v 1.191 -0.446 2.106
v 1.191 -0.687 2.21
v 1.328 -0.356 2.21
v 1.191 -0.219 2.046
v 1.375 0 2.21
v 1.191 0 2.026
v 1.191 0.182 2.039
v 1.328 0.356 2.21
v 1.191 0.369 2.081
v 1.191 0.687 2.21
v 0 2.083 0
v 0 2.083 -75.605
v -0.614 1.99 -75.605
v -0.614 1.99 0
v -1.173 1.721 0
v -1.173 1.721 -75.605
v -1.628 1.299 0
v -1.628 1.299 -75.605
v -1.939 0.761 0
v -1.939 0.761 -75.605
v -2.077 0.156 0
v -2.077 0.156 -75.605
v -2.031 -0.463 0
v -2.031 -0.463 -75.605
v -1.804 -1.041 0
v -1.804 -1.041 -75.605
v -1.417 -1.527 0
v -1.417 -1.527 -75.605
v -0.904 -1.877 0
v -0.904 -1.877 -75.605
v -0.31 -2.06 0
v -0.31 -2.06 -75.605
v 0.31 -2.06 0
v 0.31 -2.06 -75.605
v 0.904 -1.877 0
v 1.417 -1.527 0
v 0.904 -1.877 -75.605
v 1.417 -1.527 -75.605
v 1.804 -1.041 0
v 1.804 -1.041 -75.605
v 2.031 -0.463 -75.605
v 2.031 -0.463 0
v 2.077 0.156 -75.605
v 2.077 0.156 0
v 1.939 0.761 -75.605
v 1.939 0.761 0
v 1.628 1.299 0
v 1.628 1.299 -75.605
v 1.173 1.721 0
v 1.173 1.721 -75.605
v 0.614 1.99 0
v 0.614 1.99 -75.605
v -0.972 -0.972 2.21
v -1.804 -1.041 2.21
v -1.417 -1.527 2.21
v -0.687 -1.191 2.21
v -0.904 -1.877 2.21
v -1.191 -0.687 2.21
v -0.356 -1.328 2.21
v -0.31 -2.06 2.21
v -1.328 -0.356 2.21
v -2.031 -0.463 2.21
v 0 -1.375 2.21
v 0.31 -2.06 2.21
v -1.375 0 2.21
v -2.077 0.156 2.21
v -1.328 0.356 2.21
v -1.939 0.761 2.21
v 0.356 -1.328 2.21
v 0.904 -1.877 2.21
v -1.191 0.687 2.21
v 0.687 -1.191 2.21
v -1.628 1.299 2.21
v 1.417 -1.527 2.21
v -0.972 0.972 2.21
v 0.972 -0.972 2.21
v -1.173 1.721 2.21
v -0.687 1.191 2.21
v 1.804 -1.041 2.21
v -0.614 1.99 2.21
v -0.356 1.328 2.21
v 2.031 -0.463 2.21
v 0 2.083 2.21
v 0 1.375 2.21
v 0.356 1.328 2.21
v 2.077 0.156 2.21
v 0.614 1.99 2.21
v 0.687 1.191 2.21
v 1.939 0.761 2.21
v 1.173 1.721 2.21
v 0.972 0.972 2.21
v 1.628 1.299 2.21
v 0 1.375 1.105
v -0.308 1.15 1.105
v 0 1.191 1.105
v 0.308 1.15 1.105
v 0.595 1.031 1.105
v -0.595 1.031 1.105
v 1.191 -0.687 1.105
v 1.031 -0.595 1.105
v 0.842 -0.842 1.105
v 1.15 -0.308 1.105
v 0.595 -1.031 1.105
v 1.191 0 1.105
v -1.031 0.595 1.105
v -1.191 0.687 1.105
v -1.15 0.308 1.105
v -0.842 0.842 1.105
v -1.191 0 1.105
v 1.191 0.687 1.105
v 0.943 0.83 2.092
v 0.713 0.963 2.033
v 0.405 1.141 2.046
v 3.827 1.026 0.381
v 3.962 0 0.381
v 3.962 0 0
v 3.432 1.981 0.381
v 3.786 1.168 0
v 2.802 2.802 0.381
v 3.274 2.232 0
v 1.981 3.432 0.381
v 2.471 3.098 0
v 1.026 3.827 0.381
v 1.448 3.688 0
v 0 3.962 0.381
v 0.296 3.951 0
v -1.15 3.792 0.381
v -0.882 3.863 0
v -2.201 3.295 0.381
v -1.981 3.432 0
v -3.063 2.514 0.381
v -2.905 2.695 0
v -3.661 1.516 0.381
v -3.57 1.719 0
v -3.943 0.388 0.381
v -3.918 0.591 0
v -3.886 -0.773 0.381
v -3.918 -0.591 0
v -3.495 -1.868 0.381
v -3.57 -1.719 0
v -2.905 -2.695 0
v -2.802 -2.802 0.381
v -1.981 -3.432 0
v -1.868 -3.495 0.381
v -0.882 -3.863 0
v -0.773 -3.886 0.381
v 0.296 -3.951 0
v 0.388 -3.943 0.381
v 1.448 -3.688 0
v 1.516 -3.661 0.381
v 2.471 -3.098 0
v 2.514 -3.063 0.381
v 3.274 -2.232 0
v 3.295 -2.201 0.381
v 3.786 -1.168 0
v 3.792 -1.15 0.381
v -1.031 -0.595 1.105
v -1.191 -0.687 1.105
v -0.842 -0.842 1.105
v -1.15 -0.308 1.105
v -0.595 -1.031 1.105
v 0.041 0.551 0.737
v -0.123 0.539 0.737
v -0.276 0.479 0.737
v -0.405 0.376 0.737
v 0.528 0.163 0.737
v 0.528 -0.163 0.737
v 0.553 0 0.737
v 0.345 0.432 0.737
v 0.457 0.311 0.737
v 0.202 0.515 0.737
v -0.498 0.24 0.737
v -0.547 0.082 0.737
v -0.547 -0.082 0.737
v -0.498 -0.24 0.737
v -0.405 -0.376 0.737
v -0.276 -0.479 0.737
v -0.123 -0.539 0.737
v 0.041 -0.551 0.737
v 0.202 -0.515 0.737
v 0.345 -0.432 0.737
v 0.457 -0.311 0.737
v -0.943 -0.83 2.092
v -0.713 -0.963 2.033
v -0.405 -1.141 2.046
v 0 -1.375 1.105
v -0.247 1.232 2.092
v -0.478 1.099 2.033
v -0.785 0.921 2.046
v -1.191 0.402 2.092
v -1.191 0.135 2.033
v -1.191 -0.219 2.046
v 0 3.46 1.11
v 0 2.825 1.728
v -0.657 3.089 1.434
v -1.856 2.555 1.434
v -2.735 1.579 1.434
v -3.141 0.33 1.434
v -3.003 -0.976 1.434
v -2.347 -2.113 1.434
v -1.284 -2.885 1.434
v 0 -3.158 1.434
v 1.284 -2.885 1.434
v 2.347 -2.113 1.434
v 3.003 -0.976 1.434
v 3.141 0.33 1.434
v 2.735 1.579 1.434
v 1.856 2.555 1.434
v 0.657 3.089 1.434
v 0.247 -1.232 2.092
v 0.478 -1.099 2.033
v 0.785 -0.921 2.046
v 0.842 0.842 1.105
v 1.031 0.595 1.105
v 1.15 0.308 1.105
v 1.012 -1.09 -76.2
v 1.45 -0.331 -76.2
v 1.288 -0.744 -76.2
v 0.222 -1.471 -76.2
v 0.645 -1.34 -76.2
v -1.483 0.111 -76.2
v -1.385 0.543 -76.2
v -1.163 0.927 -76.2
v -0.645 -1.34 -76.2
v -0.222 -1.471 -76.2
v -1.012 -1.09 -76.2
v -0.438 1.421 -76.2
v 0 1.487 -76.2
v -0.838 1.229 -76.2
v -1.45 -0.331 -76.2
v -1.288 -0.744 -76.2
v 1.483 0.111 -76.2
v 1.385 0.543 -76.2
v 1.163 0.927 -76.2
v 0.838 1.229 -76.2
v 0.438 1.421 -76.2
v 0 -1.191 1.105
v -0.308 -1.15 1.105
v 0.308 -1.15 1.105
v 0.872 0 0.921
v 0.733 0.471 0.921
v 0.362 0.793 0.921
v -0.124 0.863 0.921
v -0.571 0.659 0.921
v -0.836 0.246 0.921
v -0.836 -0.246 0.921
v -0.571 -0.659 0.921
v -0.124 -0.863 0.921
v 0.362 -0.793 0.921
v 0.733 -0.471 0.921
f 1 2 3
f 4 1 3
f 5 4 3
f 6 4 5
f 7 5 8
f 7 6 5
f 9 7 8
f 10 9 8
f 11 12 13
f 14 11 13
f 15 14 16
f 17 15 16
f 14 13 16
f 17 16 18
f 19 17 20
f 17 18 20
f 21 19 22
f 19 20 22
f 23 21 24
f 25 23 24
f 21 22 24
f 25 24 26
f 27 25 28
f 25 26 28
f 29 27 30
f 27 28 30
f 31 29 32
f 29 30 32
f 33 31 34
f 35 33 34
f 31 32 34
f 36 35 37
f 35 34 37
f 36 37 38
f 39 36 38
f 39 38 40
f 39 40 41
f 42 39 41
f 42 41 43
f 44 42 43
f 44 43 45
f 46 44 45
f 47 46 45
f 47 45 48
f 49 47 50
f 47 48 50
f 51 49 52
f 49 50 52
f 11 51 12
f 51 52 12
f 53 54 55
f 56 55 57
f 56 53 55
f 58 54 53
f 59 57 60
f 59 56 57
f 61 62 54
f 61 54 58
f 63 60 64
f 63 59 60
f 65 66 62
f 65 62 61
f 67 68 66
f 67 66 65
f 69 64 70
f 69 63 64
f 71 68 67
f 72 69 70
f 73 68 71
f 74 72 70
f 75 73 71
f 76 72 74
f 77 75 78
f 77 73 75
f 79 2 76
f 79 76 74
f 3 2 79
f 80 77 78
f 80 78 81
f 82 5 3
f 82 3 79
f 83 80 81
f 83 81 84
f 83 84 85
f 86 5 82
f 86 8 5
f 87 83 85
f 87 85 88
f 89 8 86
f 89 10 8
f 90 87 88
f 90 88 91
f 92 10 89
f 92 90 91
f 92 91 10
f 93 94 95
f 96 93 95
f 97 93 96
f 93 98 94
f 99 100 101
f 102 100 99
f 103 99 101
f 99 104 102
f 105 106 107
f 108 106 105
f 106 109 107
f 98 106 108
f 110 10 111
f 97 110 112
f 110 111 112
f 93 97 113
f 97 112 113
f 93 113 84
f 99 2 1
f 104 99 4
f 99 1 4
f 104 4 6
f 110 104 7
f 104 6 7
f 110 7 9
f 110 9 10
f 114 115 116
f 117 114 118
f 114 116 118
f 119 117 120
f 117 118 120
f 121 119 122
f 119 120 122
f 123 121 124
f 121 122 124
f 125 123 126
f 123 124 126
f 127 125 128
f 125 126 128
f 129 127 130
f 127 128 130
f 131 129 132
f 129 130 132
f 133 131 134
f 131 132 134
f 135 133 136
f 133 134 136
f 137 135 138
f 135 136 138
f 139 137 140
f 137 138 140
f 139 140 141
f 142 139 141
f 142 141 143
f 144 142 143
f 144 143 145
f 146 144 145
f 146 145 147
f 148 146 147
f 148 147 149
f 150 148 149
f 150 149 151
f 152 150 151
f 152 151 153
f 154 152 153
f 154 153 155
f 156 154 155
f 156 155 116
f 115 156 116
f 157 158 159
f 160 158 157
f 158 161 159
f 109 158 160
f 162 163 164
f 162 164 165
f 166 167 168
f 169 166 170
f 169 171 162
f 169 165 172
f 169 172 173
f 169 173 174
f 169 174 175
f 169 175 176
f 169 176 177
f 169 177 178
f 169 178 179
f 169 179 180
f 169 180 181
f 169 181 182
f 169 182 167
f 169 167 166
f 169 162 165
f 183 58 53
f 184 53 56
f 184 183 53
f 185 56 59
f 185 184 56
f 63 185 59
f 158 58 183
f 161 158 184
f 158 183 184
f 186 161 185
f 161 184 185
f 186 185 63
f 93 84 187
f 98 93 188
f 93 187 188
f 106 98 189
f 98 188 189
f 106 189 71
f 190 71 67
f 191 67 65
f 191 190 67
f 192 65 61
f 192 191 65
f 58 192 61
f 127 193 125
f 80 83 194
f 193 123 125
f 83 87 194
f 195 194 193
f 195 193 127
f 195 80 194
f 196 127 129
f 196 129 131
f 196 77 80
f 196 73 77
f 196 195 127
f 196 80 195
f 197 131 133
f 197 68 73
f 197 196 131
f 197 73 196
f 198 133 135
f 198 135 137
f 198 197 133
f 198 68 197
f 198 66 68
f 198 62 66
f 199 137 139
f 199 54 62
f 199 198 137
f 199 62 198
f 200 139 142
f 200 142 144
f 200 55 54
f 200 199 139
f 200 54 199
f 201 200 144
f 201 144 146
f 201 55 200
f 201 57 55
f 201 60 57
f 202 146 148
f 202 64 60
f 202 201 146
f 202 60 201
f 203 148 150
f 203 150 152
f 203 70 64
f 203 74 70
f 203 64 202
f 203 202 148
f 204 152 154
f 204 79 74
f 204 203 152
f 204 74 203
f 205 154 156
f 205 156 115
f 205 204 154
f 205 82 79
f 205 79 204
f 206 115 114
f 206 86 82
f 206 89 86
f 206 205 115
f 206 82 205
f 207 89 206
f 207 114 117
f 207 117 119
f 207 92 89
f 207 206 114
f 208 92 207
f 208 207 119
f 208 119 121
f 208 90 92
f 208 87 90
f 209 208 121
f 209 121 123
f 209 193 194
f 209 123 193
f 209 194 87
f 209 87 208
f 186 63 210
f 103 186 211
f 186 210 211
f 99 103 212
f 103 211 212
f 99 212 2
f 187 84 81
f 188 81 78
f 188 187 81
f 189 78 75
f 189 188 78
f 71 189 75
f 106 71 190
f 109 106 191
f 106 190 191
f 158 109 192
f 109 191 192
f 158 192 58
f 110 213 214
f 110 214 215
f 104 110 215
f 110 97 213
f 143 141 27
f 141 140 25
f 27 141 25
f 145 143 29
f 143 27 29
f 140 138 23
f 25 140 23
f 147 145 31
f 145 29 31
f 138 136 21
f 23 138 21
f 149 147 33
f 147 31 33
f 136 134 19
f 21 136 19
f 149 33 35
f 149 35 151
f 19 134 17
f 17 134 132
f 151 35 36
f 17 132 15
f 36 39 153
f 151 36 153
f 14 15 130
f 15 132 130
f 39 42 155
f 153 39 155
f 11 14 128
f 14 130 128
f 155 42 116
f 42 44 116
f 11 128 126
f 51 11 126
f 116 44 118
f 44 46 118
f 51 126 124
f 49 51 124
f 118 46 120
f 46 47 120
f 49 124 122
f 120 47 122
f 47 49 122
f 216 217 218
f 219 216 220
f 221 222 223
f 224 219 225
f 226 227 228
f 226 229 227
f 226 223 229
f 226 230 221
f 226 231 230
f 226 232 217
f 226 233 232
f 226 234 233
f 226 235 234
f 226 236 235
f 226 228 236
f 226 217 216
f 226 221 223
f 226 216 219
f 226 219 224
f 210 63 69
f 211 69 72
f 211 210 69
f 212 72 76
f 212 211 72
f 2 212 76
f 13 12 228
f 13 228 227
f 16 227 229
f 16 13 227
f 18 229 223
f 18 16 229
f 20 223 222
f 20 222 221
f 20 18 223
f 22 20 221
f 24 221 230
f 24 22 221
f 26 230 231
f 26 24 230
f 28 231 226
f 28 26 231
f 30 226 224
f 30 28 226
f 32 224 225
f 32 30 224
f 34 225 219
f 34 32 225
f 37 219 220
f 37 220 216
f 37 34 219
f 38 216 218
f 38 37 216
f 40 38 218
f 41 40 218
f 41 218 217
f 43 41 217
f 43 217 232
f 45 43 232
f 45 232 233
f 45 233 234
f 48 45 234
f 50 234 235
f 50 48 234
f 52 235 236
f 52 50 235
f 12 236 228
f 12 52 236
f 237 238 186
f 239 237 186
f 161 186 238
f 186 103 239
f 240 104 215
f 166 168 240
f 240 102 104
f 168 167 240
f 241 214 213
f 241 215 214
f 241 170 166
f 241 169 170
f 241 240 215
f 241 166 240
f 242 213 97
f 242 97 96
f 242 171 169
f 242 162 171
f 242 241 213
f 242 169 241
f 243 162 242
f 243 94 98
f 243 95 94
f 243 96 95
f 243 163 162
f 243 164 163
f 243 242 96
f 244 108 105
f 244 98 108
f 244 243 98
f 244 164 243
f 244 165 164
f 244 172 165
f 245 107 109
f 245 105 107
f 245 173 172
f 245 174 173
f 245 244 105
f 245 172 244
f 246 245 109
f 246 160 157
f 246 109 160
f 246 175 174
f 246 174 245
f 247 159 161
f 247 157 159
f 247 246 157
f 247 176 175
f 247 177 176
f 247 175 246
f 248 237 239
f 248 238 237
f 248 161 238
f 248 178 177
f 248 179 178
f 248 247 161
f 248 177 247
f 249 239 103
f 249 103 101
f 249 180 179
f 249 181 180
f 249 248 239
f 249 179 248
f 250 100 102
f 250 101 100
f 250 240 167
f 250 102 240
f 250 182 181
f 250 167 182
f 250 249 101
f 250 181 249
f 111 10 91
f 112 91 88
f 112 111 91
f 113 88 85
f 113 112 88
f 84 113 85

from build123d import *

# Parameters (mm, degrees)
SKETCH1_W          = 76.2
SKETCH1_H          = 2.0828
CHAMFER1_SIZE      = 0.5953125
SKETCH4_R          = 3.9624
EXTRUDE1_DEPTH     = 2.2098
CUT_EXTRUDE1_DEPTH = 1.1049
SKETCH7_R          = 1.374815329
CUT_EXTRUDE4_DEPTH = 1.1049
CUT_EXTRUDE4_TAPER = 45
SKETCH8_R          = 1.190625
CUT_EXTRUDE5_DEPTH = 0.3683
CUT_EXTRUDE5_TAPER = 60


with BuildPart() as part:
    # Sketch1 → Revolve1 (revolve)
    with BuildSketch(Plane(origin=(0, 0, 0), x_dir=(0, 0, -1), z_dir=(1, 0, 0))):
        with Locations((38.1, 1.0414)):
            Rectangle(SKETCH1_W, SKETCH1_H)
    revolve(axis=Axis((0, 0, 0), (0, 0, 1)))

    # Chamfer1
    chamfer1_edges = [part.edges().sort_by_distance(p)[0] for p in [
        (0, -2.0828, -76.2),
    ]]
    chamfer(chamfer1_edges, length=CHAMFER1_SIZE)

    # Sketch4 → Extrude1 (add)
    with BuildSketch(Plane.XY):
        Circle(SKETCH4_R)
    extrude(amount=EXTRUDE1_DEPTH)

    # Sketch9 → Cut-Revolve3 (revolve, cut)
    with BuildSketch(Plane(origin=(0, 0, 0), x_dir=(0, 0, -1), z_dir=(1, 0, 0))):
        with BuildLine():
            Line((0, 3.9624), (-0.381, 3.9624))
            ThreePointArc((-0.381, 3.9624), (-1.434442989, 3.157885071), (-2.2098, 2.0828))
            Line((-2.2098, 2.0828), (-2.5908, 2.0828))
            Line((-2.5908, 2.0828), (-2.5908, 4.3434))
            Line((-2.5908, 4.3434), (0, 4.3434))
            Line((0, 4.3434), (0, 3.9624))
        make_face()
    revolve(axis=Axis((0, 0, 0), (0, 0, 1)), mode=Mode.SUBTRACT)

    # Sketch6 → Cut-Extrude1 (cut)
    with BuildSketch(Plane.XY.offset(2.2098)):
        Polygon((0, -1.374815329), (1.190625, -0.687407664), (1.190625, 0.687407664), (0, 1.374815329), (-1.190625, 0.687407664), (-1.190625, -0.687407664), align=None)
    extrude(amount=-CUT_EXTRUDE1_DEPTH, mode=Mode.SUBTRACT)

    # Sketch7 → Cut-Extrude4 (cut)
    with BuildSketch(Plane.XY.offset(2.2098)):
        Circle(SKETCH7_R)
    extrude(amount=-CUT_EXTRUDE4_DEPTH, taper=CUT_EXTRUDE4_TAPER, mode=Mode.SUBTRACT)

    # Sketch8 → Cut-Extrude5 (cut)
    with BuildSketch(Plane.XY.offset(1.1049)):
        Circle(SKETCH8_R)
    extrude(amount=-CUT_EXTRUDE5_DEPTH, taper=CUT_EXTRUDE5_TAPER, mode=Mode.SUBTRACT)


solid = part.part
